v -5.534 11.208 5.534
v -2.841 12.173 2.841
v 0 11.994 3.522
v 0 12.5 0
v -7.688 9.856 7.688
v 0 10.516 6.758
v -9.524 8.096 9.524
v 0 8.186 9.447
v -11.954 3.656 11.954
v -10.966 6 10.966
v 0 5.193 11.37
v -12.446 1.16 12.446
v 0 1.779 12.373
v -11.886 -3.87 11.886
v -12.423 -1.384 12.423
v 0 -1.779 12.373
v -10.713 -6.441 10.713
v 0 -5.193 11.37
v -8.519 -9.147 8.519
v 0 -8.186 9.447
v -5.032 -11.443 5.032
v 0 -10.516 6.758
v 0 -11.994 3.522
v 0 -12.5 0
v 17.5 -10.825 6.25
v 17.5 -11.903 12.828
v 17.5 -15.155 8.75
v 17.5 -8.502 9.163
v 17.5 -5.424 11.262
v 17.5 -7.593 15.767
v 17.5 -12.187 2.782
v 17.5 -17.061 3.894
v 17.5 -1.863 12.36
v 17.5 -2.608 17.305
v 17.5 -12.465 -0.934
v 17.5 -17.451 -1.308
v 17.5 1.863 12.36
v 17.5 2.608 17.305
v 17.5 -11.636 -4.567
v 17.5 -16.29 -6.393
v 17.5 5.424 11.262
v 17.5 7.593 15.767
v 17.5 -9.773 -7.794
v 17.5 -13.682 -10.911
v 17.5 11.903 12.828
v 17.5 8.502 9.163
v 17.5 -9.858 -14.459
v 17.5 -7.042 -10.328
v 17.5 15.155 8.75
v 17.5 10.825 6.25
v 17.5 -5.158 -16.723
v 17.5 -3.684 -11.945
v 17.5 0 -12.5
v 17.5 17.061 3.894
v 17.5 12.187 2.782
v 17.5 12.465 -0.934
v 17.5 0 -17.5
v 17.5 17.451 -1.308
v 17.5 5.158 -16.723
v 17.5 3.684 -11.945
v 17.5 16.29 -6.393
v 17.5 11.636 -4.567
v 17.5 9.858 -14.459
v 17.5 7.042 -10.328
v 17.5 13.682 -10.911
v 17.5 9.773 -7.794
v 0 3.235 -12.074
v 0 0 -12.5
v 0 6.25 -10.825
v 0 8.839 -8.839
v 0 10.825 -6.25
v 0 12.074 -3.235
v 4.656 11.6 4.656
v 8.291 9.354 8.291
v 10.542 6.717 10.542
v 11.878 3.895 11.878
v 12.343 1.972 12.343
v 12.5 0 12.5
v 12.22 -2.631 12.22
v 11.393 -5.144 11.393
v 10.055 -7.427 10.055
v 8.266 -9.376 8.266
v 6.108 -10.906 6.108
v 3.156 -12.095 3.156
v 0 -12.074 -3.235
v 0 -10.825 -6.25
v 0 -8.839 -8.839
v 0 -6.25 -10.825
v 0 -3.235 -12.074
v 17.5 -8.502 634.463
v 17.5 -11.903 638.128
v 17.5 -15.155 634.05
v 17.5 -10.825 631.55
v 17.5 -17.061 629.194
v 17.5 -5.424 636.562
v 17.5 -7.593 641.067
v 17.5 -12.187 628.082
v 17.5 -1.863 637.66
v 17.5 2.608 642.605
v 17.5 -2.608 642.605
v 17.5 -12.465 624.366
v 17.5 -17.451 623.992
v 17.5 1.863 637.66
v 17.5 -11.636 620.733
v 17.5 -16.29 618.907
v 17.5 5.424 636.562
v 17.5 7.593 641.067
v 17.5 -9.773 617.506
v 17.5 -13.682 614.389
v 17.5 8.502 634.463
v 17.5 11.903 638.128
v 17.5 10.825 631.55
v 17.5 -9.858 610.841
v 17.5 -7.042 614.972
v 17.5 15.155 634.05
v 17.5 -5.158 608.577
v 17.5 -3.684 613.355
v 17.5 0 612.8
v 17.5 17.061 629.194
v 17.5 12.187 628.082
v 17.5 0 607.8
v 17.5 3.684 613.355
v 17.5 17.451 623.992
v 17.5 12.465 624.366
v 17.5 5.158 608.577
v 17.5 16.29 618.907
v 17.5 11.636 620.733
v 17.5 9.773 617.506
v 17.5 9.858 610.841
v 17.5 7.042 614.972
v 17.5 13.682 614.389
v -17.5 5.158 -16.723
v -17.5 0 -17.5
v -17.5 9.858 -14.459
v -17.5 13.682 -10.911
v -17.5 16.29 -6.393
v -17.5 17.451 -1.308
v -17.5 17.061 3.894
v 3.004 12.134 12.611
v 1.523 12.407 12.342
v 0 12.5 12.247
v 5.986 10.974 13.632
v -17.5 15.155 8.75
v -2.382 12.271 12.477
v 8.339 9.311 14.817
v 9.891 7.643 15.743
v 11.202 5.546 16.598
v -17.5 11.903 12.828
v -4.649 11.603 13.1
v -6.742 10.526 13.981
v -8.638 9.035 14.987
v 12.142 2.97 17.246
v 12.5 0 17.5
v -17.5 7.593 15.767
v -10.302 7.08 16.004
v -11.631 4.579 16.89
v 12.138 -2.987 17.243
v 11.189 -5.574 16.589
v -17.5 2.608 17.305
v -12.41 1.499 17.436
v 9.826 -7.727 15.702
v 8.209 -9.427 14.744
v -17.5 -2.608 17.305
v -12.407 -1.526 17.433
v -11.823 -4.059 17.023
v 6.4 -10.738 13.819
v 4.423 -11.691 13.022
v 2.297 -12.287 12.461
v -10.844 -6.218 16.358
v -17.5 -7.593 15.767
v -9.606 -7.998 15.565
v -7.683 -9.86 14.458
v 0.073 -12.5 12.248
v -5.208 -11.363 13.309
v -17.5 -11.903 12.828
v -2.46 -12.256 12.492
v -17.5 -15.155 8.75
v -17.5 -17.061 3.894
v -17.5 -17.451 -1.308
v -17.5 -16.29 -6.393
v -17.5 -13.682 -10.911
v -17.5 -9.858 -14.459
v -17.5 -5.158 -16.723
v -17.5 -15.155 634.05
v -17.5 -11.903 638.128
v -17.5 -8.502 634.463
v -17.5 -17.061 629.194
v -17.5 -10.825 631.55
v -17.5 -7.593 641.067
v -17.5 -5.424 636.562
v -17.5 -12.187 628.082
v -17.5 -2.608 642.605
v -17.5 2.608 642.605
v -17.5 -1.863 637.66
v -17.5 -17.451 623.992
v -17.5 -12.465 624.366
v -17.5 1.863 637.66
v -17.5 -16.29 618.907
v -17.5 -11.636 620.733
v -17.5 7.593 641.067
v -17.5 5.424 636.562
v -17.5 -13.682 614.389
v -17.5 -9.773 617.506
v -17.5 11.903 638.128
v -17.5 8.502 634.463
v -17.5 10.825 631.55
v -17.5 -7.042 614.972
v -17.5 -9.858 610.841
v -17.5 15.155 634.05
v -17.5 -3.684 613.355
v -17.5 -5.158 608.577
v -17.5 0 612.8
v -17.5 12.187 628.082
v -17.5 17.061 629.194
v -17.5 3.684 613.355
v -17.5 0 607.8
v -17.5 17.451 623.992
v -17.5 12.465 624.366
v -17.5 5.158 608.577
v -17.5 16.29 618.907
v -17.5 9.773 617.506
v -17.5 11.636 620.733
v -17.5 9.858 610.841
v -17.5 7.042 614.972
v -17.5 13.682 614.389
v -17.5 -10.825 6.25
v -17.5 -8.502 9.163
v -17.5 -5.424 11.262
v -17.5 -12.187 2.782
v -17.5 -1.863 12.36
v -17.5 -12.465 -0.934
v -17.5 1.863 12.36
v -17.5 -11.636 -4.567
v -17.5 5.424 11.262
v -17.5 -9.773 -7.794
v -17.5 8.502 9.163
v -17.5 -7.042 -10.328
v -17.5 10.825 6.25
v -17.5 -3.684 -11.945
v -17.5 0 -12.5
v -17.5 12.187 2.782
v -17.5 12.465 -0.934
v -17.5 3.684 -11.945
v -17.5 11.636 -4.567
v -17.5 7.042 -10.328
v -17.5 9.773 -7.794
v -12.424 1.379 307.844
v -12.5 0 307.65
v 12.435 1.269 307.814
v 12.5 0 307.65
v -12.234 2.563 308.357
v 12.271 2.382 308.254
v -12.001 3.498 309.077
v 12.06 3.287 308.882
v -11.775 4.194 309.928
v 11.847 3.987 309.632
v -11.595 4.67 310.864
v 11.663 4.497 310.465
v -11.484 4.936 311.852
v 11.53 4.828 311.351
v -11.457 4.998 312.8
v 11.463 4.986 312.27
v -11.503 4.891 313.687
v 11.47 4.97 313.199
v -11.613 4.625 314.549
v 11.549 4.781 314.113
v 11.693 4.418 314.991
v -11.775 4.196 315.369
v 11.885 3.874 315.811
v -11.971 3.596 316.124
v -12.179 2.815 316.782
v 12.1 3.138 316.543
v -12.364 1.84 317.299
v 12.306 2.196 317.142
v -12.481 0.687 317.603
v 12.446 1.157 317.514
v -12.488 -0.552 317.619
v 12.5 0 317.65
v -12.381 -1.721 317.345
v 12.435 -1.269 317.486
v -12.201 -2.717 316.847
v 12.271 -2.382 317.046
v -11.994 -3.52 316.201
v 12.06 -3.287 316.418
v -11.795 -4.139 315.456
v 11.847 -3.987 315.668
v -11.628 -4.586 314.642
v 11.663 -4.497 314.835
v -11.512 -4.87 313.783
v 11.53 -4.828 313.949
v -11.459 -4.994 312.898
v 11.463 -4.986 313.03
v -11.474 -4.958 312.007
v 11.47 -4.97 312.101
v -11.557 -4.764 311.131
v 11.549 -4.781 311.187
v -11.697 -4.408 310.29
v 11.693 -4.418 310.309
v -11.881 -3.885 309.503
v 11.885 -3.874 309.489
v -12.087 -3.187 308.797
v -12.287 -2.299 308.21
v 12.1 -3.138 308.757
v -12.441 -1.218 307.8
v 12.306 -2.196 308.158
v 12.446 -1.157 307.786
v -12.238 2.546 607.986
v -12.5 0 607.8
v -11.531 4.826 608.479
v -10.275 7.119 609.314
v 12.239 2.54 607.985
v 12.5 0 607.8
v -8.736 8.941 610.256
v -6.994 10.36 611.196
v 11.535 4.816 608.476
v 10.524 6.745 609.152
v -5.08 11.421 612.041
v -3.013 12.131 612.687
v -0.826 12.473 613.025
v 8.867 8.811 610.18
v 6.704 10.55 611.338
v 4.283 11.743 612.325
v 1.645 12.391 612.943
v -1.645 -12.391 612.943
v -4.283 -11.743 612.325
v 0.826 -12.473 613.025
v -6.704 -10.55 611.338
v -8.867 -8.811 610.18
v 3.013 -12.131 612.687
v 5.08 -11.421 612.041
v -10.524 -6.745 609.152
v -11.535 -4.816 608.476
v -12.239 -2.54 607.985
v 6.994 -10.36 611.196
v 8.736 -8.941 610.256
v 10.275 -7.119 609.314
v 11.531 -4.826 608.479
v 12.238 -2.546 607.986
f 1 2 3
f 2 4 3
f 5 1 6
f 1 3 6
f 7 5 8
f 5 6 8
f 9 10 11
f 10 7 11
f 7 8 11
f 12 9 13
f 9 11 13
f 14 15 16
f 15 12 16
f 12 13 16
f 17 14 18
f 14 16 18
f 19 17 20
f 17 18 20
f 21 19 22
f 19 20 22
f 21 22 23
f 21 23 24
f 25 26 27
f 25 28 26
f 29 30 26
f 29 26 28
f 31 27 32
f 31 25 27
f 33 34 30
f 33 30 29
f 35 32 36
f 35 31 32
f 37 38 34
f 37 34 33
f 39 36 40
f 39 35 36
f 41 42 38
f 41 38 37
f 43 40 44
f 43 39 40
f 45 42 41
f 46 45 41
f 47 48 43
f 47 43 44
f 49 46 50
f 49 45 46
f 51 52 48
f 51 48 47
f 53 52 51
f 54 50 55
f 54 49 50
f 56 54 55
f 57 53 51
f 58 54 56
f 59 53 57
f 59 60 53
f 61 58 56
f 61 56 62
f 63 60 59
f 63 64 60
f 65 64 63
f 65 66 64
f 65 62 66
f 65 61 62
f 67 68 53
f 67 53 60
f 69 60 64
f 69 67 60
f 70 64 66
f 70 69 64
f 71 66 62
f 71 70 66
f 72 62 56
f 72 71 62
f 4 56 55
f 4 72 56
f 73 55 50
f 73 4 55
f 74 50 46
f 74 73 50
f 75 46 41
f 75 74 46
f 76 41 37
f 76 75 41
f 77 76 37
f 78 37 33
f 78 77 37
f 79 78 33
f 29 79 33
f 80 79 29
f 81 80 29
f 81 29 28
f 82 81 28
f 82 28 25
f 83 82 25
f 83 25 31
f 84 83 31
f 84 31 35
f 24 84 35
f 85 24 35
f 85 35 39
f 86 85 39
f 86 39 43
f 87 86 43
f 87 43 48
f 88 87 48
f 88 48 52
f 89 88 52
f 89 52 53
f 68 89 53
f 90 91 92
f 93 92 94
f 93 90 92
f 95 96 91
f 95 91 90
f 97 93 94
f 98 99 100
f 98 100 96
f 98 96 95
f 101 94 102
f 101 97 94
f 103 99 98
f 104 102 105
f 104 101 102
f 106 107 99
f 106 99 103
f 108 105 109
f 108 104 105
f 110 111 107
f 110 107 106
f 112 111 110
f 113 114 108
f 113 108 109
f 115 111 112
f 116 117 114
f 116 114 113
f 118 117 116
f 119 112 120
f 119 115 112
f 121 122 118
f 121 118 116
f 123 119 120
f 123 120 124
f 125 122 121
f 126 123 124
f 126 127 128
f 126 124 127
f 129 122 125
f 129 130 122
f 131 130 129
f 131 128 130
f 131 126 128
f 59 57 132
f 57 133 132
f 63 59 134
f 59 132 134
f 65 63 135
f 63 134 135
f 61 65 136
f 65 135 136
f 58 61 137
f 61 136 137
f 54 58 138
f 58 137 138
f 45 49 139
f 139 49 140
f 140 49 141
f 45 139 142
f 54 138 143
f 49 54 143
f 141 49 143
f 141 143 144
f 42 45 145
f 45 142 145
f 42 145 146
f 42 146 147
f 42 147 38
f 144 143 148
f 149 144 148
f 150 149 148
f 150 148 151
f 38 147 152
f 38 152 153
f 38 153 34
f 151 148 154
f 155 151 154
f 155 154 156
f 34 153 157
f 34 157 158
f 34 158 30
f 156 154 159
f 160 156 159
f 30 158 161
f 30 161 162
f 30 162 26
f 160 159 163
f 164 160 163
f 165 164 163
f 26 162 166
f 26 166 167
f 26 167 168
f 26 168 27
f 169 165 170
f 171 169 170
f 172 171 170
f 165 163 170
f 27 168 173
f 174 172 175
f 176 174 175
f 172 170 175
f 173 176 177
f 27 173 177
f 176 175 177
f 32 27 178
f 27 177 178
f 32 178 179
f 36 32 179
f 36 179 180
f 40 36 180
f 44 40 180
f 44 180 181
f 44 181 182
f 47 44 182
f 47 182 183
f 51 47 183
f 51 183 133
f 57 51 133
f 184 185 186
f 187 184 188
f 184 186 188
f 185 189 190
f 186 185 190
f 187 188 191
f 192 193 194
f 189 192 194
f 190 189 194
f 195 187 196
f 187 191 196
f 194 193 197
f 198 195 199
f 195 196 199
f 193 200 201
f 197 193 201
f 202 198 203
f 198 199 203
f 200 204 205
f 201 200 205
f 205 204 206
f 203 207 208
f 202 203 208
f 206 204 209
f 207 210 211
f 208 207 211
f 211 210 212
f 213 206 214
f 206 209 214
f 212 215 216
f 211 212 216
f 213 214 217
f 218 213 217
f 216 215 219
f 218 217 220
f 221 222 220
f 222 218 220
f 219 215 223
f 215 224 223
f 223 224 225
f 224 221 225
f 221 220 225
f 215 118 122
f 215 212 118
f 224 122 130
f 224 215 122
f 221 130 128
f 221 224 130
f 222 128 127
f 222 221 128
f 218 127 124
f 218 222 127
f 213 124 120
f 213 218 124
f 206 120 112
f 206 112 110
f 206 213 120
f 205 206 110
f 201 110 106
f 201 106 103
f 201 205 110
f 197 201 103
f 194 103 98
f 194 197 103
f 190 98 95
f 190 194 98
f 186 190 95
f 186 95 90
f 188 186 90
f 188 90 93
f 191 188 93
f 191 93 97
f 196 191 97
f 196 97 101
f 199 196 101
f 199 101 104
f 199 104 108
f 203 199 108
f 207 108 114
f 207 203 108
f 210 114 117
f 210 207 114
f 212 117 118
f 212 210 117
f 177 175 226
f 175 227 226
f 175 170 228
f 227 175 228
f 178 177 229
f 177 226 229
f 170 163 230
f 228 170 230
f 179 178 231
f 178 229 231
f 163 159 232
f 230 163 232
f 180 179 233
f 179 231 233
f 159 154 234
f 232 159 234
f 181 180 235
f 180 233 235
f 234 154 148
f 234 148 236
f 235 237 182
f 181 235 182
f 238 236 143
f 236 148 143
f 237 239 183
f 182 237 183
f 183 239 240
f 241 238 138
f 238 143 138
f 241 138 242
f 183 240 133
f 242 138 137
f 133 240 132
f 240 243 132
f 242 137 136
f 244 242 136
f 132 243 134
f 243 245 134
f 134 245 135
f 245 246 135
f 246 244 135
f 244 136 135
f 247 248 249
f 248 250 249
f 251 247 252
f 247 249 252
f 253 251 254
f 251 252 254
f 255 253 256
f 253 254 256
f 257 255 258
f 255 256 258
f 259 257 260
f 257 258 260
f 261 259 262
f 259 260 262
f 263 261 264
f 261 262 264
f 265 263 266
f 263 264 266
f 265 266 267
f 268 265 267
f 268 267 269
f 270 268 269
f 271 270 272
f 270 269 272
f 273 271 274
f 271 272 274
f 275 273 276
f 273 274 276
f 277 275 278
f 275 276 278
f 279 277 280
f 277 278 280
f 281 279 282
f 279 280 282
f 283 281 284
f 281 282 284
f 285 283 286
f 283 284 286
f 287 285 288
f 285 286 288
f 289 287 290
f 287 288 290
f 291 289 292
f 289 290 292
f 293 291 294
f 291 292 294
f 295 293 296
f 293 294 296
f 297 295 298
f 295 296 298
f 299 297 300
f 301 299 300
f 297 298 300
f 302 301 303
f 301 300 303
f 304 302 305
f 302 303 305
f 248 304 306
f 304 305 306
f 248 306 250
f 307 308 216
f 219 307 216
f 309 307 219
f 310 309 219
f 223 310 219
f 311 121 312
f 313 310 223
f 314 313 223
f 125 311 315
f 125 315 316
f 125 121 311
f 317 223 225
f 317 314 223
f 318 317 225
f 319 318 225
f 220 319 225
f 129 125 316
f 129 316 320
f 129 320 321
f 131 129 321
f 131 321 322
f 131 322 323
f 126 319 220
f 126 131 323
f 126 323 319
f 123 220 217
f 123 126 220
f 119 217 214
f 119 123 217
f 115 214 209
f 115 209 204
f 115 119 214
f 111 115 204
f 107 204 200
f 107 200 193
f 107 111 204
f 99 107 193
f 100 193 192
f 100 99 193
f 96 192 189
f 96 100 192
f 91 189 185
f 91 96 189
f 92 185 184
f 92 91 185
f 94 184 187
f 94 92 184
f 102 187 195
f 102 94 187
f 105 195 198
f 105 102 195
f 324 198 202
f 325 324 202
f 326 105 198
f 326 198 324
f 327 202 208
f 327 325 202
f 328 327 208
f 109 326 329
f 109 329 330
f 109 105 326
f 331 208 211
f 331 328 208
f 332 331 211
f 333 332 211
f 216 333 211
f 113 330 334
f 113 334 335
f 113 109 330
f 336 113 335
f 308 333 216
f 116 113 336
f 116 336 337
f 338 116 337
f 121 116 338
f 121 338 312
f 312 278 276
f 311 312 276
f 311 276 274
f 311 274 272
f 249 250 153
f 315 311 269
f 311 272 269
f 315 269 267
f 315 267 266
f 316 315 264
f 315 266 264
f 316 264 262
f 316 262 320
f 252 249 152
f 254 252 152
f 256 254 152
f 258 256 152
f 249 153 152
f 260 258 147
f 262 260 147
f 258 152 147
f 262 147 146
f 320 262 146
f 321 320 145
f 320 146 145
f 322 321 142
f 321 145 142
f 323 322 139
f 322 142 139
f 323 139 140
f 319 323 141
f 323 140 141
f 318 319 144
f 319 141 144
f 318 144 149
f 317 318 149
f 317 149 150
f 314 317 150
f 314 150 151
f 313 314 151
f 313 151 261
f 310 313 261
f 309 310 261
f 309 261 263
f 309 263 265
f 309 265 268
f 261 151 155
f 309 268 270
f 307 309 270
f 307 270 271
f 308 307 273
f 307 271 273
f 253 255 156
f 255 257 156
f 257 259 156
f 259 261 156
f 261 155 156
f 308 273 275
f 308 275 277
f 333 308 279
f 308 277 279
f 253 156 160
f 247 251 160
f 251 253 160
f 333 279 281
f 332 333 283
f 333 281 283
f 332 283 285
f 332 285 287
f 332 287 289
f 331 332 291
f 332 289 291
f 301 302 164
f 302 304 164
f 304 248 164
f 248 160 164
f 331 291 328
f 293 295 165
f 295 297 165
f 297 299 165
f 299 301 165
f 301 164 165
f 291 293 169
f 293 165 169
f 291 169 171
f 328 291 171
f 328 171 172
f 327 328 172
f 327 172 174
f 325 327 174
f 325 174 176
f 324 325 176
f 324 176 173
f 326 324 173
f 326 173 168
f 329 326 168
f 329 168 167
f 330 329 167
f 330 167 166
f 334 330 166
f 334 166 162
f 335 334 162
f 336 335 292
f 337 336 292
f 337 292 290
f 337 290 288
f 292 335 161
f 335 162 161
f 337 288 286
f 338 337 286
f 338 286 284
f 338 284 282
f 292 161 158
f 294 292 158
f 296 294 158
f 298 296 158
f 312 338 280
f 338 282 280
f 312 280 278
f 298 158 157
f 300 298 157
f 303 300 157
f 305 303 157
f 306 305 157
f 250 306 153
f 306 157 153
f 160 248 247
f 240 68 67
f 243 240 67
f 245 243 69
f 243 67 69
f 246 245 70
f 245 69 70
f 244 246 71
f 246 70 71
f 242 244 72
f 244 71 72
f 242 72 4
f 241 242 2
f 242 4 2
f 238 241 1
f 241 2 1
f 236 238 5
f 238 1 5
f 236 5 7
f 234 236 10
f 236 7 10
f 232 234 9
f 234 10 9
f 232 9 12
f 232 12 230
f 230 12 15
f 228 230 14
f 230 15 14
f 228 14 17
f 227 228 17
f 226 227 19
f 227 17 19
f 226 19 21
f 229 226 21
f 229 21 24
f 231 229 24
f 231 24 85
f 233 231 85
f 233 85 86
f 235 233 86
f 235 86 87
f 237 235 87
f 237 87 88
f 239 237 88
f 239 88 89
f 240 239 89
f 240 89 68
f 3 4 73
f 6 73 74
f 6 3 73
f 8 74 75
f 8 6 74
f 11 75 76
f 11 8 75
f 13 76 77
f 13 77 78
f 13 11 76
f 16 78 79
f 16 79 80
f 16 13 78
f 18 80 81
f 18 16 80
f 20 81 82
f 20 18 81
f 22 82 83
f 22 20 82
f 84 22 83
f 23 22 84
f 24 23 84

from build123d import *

# Parameters (mm, degrees)
SKETCH1_R           = 12.5
BOSS_EXTRUDE4_DEPTH = 625.3
SKETCH4_R           = 5
CUT_EXTRUDE2_DEPTH  = 312.65
SKETCH5_R           = 17.5
SKETCH5_R_2         = 12.5
BOSS_EXTRUDE6_DEPTH = 17.5
SKETCH7_R           = 12.5
CUT_EXTRUDE4_DEPTH  = 17.5


with BuildPart() as part:
    # Sketch1 → Boss-Extrude4 (new body)
    with BuildSketch(Plane.XY):
        Circle(SKETCH1_R)
    extrude(amount=BOSS_EXTRUDE4_DEPTH)

    # Sketch4 → Cut-Extrude2 (cut, symmetric)
    with BuildSketch(Plane(origin=(0, 0, 0), x_dir=(0, 0, -1), z_dir=(1, 0, 0))):
        with Locations((-312.65, 0)):
            Circle(SKETCH4_R)
    extrude(amount=CUT_EXTRUDE2_DEPTH, both=True, mode=Mode.SUBTRACT)

    # Sketch5 → Boss-Extrude6 (add, symmetric)
    with BuildSketch(Plane(origin=(0, 0, 0), x_dir=(0, 0, -1), z_dir=(1, 0, 0))):
        Circle(SKETCH5_R)
        Circle(SKETCH5_R_2, mode=Mode.SUBTRACT)
        with Locations((-625.3, 0)):
            Circle(SKETCH5_R)
        with Locations((-625.3, 0)):
            Circle(SKETCH5_R_2, mode=Mode.SUBTRACT)
    extrude(amount=BOSS_EXTRUDE6_DEPTH, both=True)

    # Sketch7 → Cut-Extrude4 (cut, symmetric)
    with BuildSketch(Plane(origin=(0, 0, 0), x_dir=(0, 0, -1), z_dir=(1, 0, 0))):
        Circle(SKETCH7_R)
        with Locations((-625.3, 0)):
            Circle(SKETCH7_R)
    extrude(amount=CUT_EXTRUDE4_DEPTH, both=True, mode=Mode.SUBTRACT)


solid = part.part
